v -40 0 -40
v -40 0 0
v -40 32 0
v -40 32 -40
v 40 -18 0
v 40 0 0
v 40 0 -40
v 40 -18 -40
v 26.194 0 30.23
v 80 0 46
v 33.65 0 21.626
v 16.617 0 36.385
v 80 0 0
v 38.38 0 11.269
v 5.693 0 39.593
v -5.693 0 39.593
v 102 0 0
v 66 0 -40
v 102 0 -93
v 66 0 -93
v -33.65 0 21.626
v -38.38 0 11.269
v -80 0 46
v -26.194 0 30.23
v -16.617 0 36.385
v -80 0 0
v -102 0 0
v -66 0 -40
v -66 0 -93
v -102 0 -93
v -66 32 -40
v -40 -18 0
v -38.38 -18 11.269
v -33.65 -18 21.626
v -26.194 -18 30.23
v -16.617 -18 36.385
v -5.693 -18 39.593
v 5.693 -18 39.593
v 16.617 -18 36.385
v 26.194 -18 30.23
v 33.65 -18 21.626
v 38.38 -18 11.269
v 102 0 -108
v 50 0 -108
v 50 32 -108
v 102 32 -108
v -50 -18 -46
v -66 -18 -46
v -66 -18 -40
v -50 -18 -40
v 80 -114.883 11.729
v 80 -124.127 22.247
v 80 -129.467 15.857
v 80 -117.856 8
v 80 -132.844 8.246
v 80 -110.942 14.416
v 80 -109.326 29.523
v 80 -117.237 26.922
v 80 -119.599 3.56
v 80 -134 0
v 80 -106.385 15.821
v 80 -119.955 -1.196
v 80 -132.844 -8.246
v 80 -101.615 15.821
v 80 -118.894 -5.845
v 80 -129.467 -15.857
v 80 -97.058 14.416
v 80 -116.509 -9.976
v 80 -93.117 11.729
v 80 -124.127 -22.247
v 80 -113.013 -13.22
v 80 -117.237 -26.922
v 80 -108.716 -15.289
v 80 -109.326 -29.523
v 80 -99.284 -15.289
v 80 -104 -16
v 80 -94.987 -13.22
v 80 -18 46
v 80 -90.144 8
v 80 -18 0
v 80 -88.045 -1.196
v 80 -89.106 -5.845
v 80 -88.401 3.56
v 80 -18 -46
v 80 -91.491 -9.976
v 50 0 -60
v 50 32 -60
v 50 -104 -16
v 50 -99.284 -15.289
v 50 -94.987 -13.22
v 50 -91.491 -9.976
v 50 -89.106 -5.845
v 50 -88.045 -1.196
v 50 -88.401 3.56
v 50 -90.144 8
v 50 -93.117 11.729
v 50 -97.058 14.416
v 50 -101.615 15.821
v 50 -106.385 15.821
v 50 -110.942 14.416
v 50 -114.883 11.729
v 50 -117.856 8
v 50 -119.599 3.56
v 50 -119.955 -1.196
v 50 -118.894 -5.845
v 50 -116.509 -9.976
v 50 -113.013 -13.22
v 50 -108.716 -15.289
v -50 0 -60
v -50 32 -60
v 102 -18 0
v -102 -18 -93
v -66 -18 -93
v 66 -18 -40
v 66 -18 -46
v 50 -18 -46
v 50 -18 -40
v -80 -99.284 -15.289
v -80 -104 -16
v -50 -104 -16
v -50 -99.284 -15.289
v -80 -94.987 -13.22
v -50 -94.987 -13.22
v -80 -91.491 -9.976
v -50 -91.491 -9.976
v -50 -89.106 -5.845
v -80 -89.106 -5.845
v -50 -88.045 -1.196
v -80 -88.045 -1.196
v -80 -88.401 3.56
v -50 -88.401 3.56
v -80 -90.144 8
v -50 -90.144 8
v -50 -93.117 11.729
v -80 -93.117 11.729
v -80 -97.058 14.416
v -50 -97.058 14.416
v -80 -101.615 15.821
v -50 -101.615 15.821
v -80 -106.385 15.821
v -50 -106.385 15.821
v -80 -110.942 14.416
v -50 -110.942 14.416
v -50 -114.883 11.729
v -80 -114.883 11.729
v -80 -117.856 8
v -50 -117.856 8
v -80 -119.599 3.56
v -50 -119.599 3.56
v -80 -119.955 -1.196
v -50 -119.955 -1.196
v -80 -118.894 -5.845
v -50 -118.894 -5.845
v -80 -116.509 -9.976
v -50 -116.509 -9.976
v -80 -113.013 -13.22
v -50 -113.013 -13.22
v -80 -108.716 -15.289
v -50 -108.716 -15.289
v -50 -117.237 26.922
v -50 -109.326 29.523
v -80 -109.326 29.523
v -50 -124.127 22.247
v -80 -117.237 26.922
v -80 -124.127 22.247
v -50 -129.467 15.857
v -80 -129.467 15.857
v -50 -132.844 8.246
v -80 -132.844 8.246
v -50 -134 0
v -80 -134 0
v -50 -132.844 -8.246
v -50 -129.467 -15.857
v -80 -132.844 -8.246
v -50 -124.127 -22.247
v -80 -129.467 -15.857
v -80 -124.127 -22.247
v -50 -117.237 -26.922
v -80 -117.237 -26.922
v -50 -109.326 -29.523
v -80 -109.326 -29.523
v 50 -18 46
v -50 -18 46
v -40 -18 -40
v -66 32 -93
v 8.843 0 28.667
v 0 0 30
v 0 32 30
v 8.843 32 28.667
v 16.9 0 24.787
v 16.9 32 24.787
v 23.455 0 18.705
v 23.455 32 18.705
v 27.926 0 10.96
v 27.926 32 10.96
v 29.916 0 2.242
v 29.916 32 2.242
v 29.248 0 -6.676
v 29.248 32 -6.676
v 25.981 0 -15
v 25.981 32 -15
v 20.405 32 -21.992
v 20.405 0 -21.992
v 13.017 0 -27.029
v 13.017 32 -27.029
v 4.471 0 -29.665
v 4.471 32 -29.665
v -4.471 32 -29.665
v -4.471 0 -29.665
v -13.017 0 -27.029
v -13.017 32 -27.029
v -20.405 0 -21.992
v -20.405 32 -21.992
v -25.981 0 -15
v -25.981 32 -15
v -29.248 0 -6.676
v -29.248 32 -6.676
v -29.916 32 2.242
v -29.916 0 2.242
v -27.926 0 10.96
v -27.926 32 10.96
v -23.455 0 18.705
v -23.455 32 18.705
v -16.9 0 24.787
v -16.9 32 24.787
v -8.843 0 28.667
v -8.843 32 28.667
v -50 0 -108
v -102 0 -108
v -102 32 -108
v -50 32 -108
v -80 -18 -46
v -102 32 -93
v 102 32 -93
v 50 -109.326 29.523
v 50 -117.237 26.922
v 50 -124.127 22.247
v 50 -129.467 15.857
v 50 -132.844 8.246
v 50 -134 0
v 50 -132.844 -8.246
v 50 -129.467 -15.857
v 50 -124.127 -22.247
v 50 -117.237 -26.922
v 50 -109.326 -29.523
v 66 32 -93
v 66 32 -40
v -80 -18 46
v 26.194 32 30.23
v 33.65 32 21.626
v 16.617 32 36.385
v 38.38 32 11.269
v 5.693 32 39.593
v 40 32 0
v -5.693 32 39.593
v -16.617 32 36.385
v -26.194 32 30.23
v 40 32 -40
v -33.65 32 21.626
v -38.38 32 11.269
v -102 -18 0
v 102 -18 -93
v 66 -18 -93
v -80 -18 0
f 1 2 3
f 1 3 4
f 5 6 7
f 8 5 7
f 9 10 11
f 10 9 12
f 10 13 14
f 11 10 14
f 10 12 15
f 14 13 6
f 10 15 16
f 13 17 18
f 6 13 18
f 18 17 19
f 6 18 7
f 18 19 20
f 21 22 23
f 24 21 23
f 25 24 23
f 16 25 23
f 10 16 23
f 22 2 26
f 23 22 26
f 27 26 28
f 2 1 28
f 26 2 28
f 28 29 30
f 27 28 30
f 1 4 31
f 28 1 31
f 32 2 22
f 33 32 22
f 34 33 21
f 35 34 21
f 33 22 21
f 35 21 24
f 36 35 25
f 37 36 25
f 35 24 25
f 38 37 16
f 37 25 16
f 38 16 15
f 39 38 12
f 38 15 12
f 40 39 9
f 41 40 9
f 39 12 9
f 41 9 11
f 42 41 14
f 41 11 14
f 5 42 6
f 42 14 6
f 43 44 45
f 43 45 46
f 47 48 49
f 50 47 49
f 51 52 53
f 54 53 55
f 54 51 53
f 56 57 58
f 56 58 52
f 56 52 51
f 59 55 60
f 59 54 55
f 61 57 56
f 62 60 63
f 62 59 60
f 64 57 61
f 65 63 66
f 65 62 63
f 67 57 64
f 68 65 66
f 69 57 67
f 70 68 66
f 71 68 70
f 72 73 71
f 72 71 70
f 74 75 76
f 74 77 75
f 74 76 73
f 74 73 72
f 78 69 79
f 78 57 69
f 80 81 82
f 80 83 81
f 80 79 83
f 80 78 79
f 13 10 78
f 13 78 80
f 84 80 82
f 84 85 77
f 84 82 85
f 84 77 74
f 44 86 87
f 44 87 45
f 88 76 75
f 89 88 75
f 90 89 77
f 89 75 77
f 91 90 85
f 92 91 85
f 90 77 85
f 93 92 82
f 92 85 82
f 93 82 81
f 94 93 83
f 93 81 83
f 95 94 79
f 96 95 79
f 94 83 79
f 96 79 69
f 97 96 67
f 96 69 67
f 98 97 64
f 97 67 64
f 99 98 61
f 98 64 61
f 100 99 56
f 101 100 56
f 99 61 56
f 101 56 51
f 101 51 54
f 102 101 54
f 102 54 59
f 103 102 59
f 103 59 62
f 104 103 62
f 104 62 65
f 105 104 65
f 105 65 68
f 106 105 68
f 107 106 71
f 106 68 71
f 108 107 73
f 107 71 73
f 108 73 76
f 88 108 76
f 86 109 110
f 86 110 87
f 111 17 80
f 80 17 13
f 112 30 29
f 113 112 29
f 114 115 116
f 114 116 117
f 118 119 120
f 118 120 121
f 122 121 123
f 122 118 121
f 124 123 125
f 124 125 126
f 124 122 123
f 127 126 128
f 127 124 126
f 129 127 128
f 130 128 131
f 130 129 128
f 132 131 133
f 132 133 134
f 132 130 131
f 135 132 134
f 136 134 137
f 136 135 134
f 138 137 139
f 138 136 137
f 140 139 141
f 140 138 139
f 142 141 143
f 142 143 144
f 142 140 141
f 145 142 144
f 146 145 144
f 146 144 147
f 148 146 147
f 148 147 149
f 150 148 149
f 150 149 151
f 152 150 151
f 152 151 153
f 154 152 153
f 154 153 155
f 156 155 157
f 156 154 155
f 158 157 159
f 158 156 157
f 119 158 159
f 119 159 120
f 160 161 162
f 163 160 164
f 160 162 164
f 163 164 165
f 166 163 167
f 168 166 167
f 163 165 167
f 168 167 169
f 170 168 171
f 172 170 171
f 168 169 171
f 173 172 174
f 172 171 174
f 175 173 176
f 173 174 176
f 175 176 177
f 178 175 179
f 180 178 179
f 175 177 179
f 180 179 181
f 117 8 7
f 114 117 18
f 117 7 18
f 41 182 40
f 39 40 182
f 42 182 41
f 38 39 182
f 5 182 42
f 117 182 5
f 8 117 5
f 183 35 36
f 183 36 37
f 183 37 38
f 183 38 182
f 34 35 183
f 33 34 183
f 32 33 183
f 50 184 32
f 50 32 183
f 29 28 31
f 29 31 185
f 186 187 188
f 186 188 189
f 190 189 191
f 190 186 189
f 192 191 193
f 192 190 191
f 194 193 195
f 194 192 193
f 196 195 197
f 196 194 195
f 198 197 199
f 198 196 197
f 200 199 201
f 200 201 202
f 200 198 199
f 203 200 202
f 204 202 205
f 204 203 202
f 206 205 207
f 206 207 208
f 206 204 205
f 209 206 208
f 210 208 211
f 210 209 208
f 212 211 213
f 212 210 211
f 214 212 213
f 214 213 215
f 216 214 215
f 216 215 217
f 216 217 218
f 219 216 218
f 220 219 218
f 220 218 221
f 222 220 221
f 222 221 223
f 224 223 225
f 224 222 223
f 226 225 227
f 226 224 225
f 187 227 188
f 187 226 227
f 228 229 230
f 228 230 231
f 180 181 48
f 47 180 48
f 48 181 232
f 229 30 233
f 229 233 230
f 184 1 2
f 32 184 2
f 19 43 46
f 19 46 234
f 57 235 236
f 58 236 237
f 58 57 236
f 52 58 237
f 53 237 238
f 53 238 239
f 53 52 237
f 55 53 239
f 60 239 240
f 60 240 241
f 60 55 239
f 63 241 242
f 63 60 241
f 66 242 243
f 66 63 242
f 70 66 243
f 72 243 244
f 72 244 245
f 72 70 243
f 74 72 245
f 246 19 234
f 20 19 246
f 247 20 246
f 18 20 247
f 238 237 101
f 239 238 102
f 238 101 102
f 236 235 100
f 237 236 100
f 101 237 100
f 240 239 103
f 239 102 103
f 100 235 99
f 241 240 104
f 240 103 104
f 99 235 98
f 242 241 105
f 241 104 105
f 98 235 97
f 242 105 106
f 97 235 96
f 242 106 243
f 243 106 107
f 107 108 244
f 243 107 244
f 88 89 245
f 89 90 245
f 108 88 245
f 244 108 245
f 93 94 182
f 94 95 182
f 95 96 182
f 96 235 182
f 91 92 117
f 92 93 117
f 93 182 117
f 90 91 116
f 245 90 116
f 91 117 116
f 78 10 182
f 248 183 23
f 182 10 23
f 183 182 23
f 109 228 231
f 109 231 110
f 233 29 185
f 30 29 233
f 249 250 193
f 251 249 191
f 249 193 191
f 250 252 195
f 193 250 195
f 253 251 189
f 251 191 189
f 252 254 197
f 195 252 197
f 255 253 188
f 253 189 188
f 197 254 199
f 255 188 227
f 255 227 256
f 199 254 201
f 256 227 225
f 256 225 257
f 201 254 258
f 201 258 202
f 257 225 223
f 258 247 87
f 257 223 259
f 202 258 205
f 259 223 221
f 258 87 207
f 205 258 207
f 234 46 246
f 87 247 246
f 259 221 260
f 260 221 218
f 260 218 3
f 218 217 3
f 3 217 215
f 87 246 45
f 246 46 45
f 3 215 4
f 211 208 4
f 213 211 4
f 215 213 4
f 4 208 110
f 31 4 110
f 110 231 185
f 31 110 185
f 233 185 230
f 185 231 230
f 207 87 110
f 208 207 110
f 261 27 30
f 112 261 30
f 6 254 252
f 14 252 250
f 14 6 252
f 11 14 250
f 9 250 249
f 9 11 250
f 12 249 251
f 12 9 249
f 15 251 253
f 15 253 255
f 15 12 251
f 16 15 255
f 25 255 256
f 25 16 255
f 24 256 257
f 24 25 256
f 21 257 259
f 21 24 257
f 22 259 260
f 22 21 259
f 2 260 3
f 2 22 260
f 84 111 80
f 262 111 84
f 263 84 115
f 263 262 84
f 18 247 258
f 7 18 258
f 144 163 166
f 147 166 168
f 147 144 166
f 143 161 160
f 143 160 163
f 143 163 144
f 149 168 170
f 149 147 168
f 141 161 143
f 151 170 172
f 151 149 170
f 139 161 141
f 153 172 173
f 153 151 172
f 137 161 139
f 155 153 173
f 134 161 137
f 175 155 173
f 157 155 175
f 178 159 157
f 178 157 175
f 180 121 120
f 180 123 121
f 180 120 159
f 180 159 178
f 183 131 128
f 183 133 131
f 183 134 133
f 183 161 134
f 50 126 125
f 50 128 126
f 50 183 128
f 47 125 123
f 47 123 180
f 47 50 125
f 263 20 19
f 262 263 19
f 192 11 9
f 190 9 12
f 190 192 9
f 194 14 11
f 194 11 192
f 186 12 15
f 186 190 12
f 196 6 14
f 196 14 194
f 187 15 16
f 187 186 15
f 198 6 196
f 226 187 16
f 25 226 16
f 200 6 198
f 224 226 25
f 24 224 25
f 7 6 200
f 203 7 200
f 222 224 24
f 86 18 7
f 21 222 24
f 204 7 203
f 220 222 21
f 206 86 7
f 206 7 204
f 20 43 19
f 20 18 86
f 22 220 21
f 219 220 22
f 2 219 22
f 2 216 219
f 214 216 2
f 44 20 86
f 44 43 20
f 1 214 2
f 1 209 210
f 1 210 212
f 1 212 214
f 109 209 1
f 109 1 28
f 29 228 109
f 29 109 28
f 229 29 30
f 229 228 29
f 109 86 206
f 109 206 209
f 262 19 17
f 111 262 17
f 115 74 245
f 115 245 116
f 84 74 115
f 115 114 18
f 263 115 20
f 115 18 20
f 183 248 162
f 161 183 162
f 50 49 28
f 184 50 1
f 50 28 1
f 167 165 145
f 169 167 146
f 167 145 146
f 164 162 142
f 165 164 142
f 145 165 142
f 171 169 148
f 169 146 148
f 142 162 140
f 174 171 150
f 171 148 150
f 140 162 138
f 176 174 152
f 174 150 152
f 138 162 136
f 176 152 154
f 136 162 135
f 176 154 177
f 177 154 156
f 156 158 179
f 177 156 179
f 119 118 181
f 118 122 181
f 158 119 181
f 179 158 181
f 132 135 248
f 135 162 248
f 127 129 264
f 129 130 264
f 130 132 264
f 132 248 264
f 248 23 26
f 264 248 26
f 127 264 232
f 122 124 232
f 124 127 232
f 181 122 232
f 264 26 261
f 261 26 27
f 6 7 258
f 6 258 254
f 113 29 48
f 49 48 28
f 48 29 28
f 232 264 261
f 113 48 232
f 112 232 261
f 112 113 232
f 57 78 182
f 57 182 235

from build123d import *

# Parameters (mm, degrees)
SKETCH1_R           = 30
BOSS_EXTRUDE1_DEPTH = 32
BOSS_EXTRUDE2_DEPTH = 18
SKETCH2_R           = 16
BOSS_EXTRUDE3_DEPTH = 30


with BuildPart() as part:
    # Sketch1 → Boss-Extrude1 (new body)
    with BuildSketch(Plane(origin=(0, 0, 0), x_dir=(1, 0, 0), z_dir=(0, 1, 0))):
        with BuildLine():
            ThreePointArc((-40, 0), (0, -40), (40, 0))
            Line((40, 0), (40, 40))
            Line((40, 40), (66, 40))
            Line((66, 40), (66, 93))
            Line((66, 93), (102, 93))
            Line((102, 93), (102, 108))
            Line((102, 108), (50, 108))
            Line((50, 108), (50, 60))
            Line((50, 60), (-50, 60))
            Line((-50, 60), (-50, 108))
            Line((-50, 108), (-102, 108))
            Line((-102, 108), (-102, 93))
            Line((-102, 93), (-66, 93))
            Line((-66, 93), (-66, 40))
            Line((-66, 40), (-40, 40))
            Line((-40, 40), (-40, 0))
        make_face()
        Circle(SKETCH1_R, mode=Mode.SUBTRACT)
    extrude(amount=BOSS_EXTRUDE1_DEPTH)


with BuildPart() as body_2:
    # Sketch1<3> → Boss-Extrude2 (new body)
    with BuildSketch(Plane(origin=(0, 0, 0), x_dir=(1, 0, 0), z_dir=(0, 1, 0))):
        with BuildLine():
            Line((40, 40), (40, 0))
            ThreePointArc((40, 0), (0, -40), (-40, 0))
            Line((-40, 0), (-40, 40))
            Line((-40, 40), (-66, 40))
            Line((-66, 40), (-66, 93))
            Line((-66, 93), (-102, 93))
            Line((-102, 93), (-102, 0))
            Line((-102, 0), (-80, 0))
            Line((-80, 0), (-80, -46))
            Line((-80, -46), (80, -46))
            Line((80, -46), (80, 0))
            Line((80, 0), (102, 0))
            Line((102, 0), (102, 93))
            Line((102, 93), (66, 93))
            Line((66, 93), (66, 40))
            Line((66, 40), (40, 40))
        make_face()
    extrude(amount=-BOSS_EXTRUDE2_DEPTH)

    # Sketch2 → Boss-Extrude3 (add)
    with BuildSketch(Plane(origin=(80, 0, 0), x_dir=(0, 0, -1), z_dir=(1, 0, 0))):
        with BuildLine():
            Line((-46, -18), (-29.523362503, -109.326449711))
            ThreePointArc((-29.523362503, -109.326449711), (0, -134), (29.523362503, -109.326449711))
            Line((29.523362503, -109.326449711), (46, -18))
            Line((46, -18), (-46, -18))
        make_face()
        with Locations((0, -104)):
            Circle(SKETCH2_R, mode=Mode.SUBTRACT)
    boss_extrude3 = extrude(amount=-BOSS_EXTRUDE3_DEPTH)

    # Mirror1: Boss-Extrude3 across plane
    add(boss_extrude3.mirror(Plane(origin=(0, 0, 0), x_dir=(0, 0, 1), z_dir=(1, 0, 0))))


solid = Compound([part.part, body_2.part])
